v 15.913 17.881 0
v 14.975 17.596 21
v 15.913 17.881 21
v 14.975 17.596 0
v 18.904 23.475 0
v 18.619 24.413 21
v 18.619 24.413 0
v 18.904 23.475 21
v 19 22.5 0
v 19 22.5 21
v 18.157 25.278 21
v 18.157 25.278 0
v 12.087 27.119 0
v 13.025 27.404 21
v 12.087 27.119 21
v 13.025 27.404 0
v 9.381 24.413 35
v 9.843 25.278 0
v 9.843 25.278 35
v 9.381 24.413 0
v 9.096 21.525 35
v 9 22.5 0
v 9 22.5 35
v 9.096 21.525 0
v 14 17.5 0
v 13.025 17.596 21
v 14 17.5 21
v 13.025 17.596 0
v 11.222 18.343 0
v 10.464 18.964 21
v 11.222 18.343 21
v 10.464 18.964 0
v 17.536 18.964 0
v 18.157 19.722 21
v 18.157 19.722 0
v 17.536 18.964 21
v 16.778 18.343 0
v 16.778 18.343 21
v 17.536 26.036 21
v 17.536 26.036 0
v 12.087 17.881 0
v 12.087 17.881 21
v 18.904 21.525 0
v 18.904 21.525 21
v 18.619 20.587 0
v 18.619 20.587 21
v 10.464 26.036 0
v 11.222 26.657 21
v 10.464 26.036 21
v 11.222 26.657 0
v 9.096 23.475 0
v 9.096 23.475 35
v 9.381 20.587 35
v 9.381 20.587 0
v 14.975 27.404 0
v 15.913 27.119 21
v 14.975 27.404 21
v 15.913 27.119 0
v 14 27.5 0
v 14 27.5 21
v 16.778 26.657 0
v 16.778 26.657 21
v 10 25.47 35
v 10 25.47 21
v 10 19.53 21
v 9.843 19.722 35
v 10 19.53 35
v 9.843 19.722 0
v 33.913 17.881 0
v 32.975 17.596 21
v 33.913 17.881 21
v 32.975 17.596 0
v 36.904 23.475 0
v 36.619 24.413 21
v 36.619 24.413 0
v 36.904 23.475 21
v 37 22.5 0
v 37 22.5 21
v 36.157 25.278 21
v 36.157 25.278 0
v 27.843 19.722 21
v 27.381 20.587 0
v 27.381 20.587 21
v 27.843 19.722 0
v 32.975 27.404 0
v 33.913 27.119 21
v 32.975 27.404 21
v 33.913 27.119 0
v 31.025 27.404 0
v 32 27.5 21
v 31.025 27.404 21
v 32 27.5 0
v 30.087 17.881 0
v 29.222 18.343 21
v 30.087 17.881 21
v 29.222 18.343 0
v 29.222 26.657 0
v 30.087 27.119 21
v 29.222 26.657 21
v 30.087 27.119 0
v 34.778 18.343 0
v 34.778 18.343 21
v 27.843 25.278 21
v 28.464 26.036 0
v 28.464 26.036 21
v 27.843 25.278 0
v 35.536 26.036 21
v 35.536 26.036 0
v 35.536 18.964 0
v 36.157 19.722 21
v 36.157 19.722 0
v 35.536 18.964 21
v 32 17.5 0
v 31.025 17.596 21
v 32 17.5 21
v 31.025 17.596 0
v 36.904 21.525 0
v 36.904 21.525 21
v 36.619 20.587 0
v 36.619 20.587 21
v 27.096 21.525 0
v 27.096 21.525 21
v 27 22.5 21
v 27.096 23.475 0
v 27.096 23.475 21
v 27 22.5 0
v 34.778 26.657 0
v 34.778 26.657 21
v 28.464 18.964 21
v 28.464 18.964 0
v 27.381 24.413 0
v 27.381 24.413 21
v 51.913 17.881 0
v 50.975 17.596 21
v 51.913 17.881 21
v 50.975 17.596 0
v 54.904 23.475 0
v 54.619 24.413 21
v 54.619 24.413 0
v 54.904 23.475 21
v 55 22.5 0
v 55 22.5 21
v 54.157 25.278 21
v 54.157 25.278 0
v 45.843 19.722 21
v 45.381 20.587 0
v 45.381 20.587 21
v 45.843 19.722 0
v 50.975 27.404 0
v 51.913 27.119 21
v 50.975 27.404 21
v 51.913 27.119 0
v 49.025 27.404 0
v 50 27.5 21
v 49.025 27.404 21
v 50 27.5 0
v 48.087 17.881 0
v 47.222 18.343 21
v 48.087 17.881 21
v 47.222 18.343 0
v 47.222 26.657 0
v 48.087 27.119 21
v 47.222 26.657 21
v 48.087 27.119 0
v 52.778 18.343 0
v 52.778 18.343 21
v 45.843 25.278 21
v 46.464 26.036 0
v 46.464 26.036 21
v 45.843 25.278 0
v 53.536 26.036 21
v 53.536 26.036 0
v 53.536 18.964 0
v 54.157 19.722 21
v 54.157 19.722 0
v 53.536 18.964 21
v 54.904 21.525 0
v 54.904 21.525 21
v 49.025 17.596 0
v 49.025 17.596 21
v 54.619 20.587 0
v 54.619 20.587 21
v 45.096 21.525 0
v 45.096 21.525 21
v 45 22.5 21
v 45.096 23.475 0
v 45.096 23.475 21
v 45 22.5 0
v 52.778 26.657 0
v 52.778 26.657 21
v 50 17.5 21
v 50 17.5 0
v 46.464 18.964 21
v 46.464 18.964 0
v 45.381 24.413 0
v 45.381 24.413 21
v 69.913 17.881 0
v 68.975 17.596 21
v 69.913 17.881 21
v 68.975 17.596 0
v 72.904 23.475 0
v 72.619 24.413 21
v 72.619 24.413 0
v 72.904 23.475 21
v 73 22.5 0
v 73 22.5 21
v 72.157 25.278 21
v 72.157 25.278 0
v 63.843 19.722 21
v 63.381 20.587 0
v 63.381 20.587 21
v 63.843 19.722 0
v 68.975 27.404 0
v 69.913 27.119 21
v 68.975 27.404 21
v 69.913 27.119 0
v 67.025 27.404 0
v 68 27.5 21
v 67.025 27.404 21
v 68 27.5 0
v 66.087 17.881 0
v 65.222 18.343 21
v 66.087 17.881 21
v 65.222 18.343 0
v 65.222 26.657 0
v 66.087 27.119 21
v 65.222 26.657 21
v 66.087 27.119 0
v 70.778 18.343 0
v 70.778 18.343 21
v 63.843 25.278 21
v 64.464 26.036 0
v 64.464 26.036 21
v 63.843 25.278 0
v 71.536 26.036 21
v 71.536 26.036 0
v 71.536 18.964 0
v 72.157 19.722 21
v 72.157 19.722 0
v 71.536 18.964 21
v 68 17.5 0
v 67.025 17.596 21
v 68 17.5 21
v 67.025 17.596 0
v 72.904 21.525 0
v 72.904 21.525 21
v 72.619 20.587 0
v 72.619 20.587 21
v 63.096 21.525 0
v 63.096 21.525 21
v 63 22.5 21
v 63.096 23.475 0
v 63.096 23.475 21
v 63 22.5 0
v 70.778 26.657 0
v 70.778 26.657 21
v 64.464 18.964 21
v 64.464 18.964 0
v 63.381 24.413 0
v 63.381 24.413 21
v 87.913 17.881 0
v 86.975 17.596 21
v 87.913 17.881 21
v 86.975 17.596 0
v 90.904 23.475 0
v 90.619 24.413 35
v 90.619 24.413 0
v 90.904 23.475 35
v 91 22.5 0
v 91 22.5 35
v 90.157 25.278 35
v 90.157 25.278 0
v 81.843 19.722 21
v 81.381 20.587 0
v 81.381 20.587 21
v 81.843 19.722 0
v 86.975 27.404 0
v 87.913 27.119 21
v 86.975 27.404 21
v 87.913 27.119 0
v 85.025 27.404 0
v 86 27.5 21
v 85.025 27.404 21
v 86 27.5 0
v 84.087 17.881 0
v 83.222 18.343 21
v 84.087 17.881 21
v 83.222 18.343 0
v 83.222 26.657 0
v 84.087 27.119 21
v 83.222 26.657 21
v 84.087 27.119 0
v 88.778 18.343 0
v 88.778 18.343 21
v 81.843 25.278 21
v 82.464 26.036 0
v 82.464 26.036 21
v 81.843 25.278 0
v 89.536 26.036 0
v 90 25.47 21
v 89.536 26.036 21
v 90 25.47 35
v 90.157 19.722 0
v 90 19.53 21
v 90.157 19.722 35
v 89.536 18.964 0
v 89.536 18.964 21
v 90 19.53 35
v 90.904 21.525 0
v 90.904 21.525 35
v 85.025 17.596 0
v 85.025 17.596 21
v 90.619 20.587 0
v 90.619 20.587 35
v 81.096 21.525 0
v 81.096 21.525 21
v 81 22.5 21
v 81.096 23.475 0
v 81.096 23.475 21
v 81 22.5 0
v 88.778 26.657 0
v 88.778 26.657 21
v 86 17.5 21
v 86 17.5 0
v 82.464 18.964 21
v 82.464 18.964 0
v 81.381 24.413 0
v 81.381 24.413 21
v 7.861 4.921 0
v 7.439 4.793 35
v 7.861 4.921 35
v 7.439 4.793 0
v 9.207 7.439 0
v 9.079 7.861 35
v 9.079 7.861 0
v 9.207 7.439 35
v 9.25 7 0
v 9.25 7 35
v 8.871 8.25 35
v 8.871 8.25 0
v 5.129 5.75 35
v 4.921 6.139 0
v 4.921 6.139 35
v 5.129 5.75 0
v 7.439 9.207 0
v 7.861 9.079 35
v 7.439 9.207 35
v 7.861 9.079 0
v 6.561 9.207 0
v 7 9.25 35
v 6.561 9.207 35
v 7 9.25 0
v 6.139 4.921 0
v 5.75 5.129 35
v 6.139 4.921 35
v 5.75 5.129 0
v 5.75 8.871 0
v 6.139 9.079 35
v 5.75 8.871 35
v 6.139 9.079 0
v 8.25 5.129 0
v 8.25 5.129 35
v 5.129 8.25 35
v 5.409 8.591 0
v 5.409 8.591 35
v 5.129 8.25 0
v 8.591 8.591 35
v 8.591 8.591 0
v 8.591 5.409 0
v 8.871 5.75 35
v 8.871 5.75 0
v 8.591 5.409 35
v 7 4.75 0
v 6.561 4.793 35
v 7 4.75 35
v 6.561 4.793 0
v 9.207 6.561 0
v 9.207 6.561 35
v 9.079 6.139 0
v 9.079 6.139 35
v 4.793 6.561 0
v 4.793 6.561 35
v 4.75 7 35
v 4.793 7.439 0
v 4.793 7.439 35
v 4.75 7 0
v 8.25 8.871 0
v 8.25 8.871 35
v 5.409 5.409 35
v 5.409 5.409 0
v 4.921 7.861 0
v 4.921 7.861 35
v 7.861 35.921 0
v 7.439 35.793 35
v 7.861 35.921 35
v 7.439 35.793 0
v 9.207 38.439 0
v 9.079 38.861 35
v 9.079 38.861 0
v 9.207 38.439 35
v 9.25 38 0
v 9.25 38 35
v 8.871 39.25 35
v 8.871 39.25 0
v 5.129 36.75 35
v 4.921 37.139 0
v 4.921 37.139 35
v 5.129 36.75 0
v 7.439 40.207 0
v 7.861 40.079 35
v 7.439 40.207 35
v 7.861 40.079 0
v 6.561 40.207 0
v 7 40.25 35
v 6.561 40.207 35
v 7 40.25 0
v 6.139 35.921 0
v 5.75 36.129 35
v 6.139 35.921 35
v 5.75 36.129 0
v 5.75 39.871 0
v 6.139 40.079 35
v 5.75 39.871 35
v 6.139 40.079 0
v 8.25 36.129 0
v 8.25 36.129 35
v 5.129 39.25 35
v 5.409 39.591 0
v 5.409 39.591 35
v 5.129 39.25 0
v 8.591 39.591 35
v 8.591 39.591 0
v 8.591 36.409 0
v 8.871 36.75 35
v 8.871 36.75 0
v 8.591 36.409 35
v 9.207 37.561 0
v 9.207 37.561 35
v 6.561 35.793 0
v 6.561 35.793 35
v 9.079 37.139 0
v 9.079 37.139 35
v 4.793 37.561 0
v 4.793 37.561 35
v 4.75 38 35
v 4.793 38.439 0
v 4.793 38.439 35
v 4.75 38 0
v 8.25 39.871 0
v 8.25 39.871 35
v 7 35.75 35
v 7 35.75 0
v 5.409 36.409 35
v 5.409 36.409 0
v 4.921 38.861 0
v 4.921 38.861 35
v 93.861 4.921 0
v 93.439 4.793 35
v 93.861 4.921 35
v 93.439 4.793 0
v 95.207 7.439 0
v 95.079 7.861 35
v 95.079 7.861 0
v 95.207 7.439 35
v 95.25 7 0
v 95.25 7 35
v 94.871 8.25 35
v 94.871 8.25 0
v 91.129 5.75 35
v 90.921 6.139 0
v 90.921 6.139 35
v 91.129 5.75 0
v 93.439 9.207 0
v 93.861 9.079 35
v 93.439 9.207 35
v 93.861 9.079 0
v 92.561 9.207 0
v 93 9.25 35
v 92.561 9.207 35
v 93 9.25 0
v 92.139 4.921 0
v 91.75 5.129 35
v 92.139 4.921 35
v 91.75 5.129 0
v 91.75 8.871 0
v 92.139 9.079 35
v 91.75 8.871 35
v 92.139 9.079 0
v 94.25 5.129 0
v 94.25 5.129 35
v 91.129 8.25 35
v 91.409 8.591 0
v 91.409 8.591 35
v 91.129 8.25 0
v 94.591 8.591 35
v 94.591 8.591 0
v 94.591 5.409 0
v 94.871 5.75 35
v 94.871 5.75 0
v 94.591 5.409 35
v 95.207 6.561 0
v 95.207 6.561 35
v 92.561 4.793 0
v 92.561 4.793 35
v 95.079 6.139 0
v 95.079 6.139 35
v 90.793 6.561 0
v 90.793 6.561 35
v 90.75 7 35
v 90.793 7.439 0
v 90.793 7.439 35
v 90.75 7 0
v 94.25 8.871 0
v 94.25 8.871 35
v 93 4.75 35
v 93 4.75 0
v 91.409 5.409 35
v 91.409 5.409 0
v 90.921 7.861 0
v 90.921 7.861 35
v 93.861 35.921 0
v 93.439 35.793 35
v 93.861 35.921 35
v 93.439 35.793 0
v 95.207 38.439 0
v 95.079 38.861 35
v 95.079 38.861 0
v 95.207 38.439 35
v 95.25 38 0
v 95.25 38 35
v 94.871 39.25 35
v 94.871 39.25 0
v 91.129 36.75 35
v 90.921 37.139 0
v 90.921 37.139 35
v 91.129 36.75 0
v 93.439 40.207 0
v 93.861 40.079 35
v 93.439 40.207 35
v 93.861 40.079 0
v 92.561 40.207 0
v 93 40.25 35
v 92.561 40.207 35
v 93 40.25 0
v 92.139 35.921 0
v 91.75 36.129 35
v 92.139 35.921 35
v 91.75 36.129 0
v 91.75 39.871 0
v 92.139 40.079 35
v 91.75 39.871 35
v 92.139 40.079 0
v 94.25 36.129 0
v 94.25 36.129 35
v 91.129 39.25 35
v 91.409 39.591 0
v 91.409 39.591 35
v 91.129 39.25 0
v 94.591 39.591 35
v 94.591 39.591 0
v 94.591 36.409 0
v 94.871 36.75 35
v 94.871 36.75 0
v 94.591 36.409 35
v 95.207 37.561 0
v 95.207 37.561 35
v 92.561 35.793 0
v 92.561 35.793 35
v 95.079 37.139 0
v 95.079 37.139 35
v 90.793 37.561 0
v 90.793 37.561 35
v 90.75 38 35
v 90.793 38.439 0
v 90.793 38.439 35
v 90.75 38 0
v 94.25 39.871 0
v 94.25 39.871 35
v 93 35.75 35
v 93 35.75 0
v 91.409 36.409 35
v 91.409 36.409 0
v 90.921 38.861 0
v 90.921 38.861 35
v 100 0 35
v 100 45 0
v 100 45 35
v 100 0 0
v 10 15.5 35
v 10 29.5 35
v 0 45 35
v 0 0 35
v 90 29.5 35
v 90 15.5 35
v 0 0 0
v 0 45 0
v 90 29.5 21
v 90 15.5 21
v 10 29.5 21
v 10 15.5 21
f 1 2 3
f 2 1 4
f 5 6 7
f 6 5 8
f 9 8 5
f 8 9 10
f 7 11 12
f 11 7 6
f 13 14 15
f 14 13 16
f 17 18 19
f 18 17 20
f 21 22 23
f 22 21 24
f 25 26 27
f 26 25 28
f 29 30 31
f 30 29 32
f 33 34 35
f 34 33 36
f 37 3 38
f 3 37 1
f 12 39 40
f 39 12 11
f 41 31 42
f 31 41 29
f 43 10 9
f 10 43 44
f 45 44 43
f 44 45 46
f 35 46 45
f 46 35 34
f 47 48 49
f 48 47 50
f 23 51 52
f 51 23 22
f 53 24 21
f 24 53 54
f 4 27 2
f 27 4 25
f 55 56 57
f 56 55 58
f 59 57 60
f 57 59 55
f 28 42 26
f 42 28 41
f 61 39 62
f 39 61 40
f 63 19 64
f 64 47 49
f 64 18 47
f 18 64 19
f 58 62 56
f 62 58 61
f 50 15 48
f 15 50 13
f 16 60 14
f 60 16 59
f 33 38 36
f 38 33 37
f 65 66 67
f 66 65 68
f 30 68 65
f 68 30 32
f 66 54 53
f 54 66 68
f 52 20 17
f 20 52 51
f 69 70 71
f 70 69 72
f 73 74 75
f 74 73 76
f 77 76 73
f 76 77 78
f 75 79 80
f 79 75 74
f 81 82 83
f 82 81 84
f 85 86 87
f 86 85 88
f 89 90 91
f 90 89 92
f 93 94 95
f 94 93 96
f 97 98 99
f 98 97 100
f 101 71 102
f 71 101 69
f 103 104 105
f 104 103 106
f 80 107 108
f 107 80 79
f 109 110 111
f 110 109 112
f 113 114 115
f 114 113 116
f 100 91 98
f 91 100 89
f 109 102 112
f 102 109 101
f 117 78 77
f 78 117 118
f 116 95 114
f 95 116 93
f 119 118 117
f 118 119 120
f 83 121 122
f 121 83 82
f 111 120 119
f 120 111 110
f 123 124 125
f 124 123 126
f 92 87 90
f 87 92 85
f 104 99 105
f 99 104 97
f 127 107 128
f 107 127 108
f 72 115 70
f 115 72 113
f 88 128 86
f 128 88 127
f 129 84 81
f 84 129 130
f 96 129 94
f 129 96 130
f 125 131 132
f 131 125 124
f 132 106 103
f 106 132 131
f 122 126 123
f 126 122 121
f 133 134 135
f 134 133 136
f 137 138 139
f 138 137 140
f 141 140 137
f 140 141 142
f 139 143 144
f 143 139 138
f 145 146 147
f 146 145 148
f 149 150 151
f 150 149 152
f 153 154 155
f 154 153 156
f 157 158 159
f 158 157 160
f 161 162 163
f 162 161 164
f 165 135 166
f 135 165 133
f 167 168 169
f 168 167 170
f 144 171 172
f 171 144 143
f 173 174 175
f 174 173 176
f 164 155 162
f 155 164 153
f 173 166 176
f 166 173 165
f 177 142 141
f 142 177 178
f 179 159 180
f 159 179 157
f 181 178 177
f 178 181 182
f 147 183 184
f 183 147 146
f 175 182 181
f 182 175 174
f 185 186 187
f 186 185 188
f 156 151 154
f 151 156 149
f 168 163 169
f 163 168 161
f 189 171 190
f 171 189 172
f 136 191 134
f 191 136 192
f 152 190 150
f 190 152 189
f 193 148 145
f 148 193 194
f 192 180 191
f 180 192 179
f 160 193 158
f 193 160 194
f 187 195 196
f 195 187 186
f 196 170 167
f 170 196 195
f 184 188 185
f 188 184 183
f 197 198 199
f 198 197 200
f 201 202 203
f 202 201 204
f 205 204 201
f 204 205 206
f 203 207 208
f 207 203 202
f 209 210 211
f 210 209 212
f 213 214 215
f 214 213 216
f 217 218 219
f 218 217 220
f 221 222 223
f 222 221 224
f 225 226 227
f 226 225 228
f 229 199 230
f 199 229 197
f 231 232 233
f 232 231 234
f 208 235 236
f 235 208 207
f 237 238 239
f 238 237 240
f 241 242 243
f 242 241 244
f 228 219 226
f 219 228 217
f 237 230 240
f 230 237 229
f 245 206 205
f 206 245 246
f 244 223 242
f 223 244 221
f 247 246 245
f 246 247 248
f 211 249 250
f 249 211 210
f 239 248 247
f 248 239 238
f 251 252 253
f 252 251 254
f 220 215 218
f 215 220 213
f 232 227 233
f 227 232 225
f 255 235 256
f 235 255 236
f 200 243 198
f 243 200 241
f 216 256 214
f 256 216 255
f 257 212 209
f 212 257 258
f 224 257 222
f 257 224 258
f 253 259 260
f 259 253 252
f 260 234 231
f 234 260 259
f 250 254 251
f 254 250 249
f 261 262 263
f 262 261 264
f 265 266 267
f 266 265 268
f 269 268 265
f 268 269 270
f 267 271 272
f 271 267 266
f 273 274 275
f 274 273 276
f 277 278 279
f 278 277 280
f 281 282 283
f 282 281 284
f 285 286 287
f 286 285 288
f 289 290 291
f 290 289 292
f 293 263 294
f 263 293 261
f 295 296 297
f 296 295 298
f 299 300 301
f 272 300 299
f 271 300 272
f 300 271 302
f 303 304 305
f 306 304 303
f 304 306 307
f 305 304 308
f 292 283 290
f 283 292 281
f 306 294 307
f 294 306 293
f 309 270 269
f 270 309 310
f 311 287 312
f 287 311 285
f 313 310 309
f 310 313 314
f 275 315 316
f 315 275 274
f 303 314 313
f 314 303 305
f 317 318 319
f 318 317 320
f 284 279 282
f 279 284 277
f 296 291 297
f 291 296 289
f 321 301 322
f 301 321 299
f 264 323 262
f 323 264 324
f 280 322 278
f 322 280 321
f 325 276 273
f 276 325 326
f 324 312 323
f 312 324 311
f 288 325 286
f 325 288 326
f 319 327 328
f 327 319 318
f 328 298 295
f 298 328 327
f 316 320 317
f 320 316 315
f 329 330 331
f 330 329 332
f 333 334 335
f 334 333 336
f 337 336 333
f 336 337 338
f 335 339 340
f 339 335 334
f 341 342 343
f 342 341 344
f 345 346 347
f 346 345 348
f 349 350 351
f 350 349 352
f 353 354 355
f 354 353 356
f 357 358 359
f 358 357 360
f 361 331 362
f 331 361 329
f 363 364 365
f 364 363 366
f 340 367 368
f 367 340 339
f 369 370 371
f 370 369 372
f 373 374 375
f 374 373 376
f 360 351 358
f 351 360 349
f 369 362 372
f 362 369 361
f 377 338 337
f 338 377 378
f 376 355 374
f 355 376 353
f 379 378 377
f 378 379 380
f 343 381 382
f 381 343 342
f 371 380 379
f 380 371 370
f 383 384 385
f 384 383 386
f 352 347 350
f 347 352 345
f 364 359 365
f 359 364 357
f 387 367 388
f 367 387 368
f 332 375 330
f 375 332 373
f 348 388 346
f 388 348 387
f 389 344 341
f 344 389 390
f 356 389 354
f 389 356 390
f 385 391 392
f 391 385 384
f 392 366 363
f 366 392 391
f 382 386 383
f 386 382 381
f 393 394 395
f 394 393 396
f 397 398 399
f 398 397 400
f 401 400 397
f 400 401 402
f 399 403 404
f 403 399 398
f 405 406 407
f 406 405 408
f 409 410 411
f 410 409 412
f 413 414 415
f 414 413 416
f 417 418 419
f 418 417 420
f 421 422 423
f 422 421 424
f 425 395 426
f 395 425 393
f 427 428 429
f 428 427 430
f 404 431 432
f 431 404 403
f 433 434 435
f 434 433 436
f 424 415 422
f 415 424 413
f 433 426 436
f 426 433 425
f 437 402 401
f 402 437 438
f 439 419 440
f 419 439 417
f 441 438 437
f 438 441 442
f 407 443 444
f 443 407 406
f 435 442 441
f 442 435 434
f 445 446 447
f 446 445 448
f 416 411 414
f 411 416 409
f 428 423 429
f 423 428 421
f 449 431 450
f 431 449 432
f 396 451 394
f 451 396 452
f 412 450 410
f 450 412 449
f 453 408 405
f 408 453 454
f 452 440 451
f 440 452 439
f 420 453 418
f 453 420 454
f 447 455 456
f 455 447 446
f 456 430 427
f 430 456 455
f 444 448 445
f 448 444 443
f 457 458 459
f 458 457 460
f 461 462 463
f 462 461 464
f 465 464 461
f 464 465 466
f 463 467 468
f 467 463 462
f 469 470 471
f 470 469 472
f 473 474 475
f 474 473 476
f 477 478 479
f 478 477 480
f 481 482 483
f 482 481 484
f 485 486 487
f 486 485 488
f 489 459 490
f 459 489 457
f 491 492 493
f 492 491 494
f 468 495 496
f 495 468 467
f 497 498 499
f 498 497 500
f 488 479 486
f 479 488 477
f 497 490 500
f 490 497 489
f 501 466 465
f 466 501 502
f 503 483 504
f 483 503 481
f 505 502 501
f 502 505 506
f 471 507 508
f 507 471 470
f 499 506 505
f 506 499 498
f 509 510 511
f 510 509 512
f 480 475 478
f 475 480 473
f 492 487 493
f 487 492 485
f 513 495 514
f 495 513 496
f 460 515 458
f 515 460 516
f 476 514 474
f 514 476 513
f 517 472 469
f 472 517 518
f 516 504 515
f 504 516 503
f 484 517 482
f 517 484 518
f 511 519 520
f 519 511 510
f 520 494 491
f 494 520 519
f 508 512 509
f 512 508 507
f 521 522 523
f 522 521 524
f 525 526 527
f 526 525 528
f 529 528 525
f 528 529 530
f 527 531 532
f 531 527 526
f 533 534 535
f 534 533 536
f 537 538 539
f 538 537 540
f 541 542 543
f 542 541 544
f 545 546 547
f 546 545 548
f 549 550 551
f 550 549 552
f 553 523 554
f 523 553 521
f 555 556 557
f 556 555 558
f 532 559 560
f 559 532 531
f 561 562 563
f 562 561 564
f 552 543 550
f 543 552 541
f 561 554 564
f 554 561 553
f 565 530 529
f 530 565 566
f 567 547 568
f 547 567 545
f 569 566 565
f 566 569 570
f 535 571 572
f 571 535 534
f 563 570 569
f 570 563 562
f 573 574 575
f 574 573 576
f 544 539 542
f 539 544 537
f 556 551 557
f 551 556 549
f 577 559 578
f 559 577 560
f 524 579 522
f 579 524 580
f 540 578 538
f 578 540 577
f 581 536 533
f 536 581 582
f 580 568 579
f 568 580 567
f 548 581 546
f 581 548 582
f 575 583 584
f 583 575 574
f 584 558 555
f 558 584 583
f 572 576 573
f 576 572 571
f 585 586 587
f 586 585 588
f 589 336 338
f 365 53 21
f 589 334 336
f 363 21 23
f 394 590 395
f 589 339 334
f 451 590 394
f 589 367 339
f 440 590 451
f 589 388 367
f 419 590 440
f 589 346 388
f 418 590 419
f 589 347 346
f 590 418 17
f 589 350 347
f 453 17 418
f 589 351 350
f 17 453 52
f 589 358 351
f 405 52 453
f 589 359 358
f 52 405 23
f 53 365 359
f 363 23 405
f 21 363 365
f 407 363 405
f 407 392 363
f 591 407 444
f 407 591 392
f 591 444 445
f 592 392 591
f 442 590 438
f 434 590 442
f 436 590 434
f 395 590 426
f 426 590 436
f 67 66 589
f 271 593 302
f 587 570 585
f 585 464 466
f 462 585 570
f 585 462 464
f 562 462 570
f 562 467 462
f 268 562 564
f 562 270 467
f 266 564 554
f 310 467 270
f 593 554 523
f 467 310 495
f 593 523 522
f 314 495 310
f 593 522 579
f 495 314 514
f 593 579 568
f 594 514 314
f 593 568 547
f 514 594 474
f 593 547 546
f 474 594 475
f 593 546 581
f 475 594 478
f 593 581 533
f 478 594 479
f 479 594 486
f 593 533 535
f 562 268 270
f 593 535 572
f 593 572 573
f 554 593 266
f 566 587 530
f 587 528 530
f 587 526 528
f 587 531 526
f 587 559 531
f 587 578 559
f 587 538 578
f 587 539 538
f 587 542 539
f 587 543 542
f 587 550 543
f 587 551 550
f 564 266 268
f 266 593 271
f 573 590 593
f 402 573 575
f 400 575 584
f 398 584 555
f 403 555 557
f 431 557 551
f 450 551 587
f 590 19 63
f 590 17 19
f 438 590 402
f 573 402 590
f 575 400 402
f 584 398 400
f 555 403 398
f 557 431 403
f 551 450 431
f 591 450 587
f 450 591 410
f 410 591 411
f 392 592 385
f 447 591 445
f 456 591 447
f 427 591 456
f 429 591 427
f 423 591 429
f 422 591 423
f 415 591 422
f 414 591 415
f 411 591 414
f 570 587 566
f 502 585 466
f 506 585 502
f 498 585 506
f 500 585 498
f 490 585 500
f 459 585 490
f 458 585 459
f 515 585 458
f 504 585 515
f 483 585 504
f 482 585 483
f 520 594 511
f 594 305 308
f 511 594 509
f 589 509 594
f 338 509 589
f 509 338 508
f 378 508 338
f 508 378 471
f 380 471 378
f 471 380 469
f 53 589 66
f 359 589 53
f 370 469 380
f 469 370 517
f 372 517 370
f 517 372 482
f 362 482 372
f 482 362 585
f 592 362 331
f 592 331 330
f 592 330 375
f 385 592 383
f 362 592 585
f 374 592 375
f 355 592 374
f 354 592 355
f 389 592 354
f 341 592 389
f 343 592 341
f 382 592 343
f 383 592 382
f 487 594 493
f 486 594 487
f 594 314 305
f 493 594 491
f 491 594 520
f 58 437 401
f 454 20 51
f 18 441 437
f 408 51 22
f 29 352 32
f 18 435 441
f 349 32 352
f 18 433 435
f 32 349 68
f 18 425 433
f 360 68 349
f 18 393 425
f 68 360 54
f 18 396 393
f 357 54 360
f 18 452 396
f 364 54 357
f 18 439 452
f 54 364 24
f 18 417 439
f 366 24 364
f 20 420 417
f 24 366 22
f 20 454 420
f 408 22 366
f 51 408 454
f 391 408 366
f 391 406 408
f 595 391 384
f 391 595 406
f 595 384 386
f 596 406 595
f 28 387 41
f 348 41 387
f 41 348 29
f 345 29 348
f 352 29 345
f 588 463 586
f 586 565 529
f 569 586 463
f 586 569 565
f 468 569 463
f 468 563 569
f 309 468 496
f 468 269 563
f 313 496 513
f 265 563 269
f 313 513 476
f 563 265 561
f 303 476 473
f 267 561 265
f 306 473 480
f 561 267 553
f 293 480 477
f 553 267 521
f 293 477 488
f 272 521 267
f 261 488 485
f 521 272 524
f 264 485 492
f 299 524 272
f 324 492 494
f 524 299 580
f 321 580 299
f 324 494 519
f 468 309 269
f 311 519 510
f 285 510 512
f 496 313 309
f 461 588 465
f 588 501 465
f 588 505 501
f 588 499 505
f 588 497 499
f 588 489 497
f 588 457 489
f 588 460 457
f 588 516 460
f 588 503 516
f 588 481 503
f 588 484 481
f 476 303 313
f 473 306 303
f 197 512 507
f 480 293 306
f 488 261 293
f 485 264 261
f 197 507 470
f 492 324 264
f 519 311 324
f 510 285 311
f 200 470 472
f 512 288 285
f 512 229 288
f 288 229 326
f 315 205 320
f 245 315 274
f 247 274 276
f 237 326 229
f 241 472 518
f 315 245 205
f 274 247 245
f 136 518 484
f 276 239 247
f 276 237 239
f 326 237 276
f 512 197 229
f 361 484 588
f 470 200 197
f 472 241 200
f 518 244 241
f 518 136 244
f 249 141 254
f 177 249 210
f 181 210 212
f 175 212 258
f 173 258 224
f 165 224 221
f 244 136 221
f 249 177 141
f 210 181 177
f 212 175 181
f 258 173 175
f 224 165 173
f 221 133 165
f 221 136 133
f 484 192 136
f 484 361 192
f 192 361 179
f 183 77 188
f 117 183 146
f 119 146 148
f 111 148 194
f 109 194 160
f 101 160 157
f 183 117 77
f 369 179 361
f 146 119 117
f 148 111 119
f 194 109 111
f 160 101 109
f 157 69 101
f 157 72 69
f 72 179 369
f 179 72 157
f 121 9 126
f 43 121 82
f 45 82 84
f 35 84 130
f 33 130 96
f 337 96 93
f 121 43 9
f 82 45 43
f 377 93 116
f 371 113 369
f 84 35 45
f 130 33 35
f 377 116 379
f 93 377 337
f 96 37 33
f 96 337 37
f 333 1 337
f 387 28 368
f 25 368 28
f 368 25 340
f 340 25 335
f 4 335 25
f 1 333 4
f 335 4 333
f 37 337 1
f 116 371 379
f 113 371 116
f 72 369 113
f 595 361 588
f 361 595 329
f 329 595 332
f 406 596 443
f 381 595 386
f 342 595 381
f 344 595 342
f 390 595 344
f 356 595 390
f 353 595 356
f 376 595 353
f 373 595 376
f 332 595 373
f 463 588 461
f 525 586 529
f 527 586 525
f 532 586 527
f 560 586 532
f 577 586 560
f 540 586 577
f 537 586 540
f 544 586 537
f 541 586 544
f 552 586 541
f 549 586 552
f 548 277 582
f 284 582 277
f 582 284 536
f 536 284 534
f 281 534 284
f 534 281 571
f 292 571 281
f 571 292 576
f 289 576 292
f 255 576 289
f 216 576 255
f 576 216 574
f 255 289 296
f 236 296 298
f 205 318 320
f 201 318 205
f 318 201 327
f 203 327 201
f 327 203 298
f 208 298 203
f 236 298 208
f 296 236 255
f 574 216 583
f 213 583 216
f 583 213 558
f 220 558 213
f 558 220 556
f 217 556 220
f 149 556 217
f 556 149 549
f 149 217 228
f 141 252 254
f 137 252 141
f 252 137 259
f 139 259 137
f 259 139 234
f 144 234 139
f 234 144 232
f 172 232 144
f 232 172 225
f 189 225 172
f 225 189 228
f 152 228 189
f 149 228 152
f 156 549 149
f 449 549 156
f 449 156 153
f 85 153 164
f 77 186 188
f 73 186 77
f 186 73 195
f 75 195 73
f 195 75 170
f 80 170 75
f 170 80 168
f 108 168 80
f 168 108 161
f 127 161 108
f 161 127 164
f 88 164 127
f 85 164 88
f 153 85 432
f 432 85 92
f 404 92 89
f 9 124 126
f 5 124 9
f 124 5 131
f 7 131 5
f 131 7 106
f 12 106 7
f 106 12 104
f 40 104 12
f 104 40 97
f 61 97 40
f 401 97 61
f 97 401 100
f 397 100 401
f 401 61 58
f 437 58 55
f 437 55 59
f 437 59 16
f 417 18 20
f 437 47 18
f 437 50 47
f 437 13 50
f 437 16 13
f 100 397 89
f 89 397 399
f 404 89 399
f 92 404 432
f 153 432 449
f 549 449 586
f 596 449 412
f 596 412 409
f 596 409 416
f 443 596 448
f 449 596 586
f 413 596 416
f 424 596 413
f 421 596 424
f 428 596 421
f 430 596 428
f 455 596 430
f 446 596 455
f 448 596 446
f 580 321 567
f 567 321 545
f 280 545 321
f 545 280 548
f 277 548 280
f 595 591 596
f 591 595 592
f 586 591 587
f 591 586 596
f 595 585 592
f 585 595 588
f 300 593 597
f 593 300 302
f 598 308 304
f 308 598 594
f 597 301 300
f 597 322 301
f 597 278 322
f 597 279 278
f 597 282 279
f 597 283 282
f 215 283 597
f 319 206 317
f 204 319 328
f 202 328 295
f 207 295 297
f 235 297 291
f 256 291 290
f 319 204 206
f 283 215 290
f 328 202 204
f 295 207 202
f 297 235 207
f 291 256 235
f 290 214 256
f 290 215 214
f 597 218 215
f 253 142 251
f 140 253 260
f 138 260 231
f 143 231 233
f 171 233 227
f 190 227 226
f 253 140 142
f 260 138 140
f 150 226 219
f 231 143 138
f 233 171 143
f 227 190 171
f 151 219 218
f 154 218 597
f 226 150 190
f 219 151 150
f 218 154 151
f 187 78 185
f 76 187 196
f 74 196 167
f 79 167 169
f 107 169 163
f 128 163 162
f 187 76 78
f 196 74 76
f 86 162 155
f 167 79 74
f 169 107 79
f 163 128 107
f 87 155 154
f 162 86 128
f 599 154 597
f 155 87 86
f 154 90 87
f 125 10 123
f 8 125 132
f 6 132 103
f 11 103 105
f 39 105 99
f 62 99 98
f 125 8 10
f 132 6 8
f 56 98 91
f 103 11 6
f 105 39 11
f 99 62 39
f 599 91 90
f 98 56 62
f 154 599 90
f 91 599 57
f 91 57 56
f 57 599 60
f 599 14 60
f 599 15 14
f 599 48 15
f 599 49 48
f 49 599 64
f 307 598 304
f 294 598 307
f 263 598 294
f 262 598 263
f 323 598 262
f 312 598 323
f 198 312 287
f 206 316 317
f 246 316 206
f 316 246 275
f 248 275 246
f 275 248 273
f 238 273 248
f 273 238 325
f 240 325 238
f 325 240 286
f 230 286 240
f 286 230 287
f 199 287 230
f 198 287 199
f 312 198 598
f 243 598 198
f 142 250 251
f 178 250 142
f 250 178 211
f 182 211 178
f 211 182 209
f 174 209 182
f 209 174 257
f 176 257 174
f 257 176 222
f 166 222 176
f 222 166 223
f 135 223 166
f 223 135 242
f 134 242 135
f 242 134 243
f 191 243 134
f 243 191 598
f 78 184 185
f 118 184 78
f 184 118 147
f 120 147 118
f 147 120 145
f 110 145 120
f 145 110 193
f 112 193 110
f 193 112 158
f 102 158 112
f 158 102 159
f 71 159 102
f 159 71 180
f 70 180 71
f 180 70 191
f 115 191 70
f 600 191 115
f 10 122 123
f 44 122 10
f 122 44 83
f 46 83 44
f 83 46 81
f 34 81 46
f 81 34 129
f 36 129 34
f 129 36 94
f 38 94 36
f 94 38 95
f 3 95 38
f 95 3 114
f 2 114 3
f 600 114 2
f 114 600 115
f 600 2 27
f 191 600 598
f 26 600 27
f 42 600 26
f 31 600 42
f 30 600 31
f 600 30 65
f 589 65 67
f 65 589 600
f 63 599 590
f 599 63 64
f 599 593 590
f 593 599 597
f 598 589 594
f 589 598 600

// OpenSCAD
$fn = 32;

// ----------------------------------------------------------------------
// Manifold block: gallery_top manifold
// ----------------------------------------------------------------------

// --- parameters (mm) ---
block_l = 100;            // block length, X
block_w = 45;             // block width, Y
block_h = 35;             // block height, Z
port_d = 10;              // port bore diameter
port_pitch = 18;          // port pitch along X
gallery_d = 14;           // top gallery width, Y
gallery_depth = 14;       // gallery pocket depth
wall_p = 10;              // gallery end wall thickness, X
mnt_d = 4.5;              // mounting hole diameter
mnt_in = 7;               // mounting hole inset from the edges

n_ports = 5;  // ports in the row
port_x0 = (block_l - (n_ports - 1) * port_pitch) / 2;  // first port X

difference() {
  cube([block_l, block_w, block_h]);
  for (i = [0 : n_ports - 1])
    translate([port_x0 + i * port_pitch, block_w / 2, -1])
      cylinder(h = block_h + 2, d = port_d);
  translate([wall_p, block_w / 2 - gallery_d / 2, block_h - gallery_depth])
    cube([block_l - 2 * wall_p, gallery_d, gallery_depth + 1]);
  for (cx = [mnt_in, block_l - mnt_in])
    for (cy = [mnt_in, block_w - mnt_in])
      translate([cx, cy, -1]) cylinder(h = block_h + 2, d = mnt_d);
}
